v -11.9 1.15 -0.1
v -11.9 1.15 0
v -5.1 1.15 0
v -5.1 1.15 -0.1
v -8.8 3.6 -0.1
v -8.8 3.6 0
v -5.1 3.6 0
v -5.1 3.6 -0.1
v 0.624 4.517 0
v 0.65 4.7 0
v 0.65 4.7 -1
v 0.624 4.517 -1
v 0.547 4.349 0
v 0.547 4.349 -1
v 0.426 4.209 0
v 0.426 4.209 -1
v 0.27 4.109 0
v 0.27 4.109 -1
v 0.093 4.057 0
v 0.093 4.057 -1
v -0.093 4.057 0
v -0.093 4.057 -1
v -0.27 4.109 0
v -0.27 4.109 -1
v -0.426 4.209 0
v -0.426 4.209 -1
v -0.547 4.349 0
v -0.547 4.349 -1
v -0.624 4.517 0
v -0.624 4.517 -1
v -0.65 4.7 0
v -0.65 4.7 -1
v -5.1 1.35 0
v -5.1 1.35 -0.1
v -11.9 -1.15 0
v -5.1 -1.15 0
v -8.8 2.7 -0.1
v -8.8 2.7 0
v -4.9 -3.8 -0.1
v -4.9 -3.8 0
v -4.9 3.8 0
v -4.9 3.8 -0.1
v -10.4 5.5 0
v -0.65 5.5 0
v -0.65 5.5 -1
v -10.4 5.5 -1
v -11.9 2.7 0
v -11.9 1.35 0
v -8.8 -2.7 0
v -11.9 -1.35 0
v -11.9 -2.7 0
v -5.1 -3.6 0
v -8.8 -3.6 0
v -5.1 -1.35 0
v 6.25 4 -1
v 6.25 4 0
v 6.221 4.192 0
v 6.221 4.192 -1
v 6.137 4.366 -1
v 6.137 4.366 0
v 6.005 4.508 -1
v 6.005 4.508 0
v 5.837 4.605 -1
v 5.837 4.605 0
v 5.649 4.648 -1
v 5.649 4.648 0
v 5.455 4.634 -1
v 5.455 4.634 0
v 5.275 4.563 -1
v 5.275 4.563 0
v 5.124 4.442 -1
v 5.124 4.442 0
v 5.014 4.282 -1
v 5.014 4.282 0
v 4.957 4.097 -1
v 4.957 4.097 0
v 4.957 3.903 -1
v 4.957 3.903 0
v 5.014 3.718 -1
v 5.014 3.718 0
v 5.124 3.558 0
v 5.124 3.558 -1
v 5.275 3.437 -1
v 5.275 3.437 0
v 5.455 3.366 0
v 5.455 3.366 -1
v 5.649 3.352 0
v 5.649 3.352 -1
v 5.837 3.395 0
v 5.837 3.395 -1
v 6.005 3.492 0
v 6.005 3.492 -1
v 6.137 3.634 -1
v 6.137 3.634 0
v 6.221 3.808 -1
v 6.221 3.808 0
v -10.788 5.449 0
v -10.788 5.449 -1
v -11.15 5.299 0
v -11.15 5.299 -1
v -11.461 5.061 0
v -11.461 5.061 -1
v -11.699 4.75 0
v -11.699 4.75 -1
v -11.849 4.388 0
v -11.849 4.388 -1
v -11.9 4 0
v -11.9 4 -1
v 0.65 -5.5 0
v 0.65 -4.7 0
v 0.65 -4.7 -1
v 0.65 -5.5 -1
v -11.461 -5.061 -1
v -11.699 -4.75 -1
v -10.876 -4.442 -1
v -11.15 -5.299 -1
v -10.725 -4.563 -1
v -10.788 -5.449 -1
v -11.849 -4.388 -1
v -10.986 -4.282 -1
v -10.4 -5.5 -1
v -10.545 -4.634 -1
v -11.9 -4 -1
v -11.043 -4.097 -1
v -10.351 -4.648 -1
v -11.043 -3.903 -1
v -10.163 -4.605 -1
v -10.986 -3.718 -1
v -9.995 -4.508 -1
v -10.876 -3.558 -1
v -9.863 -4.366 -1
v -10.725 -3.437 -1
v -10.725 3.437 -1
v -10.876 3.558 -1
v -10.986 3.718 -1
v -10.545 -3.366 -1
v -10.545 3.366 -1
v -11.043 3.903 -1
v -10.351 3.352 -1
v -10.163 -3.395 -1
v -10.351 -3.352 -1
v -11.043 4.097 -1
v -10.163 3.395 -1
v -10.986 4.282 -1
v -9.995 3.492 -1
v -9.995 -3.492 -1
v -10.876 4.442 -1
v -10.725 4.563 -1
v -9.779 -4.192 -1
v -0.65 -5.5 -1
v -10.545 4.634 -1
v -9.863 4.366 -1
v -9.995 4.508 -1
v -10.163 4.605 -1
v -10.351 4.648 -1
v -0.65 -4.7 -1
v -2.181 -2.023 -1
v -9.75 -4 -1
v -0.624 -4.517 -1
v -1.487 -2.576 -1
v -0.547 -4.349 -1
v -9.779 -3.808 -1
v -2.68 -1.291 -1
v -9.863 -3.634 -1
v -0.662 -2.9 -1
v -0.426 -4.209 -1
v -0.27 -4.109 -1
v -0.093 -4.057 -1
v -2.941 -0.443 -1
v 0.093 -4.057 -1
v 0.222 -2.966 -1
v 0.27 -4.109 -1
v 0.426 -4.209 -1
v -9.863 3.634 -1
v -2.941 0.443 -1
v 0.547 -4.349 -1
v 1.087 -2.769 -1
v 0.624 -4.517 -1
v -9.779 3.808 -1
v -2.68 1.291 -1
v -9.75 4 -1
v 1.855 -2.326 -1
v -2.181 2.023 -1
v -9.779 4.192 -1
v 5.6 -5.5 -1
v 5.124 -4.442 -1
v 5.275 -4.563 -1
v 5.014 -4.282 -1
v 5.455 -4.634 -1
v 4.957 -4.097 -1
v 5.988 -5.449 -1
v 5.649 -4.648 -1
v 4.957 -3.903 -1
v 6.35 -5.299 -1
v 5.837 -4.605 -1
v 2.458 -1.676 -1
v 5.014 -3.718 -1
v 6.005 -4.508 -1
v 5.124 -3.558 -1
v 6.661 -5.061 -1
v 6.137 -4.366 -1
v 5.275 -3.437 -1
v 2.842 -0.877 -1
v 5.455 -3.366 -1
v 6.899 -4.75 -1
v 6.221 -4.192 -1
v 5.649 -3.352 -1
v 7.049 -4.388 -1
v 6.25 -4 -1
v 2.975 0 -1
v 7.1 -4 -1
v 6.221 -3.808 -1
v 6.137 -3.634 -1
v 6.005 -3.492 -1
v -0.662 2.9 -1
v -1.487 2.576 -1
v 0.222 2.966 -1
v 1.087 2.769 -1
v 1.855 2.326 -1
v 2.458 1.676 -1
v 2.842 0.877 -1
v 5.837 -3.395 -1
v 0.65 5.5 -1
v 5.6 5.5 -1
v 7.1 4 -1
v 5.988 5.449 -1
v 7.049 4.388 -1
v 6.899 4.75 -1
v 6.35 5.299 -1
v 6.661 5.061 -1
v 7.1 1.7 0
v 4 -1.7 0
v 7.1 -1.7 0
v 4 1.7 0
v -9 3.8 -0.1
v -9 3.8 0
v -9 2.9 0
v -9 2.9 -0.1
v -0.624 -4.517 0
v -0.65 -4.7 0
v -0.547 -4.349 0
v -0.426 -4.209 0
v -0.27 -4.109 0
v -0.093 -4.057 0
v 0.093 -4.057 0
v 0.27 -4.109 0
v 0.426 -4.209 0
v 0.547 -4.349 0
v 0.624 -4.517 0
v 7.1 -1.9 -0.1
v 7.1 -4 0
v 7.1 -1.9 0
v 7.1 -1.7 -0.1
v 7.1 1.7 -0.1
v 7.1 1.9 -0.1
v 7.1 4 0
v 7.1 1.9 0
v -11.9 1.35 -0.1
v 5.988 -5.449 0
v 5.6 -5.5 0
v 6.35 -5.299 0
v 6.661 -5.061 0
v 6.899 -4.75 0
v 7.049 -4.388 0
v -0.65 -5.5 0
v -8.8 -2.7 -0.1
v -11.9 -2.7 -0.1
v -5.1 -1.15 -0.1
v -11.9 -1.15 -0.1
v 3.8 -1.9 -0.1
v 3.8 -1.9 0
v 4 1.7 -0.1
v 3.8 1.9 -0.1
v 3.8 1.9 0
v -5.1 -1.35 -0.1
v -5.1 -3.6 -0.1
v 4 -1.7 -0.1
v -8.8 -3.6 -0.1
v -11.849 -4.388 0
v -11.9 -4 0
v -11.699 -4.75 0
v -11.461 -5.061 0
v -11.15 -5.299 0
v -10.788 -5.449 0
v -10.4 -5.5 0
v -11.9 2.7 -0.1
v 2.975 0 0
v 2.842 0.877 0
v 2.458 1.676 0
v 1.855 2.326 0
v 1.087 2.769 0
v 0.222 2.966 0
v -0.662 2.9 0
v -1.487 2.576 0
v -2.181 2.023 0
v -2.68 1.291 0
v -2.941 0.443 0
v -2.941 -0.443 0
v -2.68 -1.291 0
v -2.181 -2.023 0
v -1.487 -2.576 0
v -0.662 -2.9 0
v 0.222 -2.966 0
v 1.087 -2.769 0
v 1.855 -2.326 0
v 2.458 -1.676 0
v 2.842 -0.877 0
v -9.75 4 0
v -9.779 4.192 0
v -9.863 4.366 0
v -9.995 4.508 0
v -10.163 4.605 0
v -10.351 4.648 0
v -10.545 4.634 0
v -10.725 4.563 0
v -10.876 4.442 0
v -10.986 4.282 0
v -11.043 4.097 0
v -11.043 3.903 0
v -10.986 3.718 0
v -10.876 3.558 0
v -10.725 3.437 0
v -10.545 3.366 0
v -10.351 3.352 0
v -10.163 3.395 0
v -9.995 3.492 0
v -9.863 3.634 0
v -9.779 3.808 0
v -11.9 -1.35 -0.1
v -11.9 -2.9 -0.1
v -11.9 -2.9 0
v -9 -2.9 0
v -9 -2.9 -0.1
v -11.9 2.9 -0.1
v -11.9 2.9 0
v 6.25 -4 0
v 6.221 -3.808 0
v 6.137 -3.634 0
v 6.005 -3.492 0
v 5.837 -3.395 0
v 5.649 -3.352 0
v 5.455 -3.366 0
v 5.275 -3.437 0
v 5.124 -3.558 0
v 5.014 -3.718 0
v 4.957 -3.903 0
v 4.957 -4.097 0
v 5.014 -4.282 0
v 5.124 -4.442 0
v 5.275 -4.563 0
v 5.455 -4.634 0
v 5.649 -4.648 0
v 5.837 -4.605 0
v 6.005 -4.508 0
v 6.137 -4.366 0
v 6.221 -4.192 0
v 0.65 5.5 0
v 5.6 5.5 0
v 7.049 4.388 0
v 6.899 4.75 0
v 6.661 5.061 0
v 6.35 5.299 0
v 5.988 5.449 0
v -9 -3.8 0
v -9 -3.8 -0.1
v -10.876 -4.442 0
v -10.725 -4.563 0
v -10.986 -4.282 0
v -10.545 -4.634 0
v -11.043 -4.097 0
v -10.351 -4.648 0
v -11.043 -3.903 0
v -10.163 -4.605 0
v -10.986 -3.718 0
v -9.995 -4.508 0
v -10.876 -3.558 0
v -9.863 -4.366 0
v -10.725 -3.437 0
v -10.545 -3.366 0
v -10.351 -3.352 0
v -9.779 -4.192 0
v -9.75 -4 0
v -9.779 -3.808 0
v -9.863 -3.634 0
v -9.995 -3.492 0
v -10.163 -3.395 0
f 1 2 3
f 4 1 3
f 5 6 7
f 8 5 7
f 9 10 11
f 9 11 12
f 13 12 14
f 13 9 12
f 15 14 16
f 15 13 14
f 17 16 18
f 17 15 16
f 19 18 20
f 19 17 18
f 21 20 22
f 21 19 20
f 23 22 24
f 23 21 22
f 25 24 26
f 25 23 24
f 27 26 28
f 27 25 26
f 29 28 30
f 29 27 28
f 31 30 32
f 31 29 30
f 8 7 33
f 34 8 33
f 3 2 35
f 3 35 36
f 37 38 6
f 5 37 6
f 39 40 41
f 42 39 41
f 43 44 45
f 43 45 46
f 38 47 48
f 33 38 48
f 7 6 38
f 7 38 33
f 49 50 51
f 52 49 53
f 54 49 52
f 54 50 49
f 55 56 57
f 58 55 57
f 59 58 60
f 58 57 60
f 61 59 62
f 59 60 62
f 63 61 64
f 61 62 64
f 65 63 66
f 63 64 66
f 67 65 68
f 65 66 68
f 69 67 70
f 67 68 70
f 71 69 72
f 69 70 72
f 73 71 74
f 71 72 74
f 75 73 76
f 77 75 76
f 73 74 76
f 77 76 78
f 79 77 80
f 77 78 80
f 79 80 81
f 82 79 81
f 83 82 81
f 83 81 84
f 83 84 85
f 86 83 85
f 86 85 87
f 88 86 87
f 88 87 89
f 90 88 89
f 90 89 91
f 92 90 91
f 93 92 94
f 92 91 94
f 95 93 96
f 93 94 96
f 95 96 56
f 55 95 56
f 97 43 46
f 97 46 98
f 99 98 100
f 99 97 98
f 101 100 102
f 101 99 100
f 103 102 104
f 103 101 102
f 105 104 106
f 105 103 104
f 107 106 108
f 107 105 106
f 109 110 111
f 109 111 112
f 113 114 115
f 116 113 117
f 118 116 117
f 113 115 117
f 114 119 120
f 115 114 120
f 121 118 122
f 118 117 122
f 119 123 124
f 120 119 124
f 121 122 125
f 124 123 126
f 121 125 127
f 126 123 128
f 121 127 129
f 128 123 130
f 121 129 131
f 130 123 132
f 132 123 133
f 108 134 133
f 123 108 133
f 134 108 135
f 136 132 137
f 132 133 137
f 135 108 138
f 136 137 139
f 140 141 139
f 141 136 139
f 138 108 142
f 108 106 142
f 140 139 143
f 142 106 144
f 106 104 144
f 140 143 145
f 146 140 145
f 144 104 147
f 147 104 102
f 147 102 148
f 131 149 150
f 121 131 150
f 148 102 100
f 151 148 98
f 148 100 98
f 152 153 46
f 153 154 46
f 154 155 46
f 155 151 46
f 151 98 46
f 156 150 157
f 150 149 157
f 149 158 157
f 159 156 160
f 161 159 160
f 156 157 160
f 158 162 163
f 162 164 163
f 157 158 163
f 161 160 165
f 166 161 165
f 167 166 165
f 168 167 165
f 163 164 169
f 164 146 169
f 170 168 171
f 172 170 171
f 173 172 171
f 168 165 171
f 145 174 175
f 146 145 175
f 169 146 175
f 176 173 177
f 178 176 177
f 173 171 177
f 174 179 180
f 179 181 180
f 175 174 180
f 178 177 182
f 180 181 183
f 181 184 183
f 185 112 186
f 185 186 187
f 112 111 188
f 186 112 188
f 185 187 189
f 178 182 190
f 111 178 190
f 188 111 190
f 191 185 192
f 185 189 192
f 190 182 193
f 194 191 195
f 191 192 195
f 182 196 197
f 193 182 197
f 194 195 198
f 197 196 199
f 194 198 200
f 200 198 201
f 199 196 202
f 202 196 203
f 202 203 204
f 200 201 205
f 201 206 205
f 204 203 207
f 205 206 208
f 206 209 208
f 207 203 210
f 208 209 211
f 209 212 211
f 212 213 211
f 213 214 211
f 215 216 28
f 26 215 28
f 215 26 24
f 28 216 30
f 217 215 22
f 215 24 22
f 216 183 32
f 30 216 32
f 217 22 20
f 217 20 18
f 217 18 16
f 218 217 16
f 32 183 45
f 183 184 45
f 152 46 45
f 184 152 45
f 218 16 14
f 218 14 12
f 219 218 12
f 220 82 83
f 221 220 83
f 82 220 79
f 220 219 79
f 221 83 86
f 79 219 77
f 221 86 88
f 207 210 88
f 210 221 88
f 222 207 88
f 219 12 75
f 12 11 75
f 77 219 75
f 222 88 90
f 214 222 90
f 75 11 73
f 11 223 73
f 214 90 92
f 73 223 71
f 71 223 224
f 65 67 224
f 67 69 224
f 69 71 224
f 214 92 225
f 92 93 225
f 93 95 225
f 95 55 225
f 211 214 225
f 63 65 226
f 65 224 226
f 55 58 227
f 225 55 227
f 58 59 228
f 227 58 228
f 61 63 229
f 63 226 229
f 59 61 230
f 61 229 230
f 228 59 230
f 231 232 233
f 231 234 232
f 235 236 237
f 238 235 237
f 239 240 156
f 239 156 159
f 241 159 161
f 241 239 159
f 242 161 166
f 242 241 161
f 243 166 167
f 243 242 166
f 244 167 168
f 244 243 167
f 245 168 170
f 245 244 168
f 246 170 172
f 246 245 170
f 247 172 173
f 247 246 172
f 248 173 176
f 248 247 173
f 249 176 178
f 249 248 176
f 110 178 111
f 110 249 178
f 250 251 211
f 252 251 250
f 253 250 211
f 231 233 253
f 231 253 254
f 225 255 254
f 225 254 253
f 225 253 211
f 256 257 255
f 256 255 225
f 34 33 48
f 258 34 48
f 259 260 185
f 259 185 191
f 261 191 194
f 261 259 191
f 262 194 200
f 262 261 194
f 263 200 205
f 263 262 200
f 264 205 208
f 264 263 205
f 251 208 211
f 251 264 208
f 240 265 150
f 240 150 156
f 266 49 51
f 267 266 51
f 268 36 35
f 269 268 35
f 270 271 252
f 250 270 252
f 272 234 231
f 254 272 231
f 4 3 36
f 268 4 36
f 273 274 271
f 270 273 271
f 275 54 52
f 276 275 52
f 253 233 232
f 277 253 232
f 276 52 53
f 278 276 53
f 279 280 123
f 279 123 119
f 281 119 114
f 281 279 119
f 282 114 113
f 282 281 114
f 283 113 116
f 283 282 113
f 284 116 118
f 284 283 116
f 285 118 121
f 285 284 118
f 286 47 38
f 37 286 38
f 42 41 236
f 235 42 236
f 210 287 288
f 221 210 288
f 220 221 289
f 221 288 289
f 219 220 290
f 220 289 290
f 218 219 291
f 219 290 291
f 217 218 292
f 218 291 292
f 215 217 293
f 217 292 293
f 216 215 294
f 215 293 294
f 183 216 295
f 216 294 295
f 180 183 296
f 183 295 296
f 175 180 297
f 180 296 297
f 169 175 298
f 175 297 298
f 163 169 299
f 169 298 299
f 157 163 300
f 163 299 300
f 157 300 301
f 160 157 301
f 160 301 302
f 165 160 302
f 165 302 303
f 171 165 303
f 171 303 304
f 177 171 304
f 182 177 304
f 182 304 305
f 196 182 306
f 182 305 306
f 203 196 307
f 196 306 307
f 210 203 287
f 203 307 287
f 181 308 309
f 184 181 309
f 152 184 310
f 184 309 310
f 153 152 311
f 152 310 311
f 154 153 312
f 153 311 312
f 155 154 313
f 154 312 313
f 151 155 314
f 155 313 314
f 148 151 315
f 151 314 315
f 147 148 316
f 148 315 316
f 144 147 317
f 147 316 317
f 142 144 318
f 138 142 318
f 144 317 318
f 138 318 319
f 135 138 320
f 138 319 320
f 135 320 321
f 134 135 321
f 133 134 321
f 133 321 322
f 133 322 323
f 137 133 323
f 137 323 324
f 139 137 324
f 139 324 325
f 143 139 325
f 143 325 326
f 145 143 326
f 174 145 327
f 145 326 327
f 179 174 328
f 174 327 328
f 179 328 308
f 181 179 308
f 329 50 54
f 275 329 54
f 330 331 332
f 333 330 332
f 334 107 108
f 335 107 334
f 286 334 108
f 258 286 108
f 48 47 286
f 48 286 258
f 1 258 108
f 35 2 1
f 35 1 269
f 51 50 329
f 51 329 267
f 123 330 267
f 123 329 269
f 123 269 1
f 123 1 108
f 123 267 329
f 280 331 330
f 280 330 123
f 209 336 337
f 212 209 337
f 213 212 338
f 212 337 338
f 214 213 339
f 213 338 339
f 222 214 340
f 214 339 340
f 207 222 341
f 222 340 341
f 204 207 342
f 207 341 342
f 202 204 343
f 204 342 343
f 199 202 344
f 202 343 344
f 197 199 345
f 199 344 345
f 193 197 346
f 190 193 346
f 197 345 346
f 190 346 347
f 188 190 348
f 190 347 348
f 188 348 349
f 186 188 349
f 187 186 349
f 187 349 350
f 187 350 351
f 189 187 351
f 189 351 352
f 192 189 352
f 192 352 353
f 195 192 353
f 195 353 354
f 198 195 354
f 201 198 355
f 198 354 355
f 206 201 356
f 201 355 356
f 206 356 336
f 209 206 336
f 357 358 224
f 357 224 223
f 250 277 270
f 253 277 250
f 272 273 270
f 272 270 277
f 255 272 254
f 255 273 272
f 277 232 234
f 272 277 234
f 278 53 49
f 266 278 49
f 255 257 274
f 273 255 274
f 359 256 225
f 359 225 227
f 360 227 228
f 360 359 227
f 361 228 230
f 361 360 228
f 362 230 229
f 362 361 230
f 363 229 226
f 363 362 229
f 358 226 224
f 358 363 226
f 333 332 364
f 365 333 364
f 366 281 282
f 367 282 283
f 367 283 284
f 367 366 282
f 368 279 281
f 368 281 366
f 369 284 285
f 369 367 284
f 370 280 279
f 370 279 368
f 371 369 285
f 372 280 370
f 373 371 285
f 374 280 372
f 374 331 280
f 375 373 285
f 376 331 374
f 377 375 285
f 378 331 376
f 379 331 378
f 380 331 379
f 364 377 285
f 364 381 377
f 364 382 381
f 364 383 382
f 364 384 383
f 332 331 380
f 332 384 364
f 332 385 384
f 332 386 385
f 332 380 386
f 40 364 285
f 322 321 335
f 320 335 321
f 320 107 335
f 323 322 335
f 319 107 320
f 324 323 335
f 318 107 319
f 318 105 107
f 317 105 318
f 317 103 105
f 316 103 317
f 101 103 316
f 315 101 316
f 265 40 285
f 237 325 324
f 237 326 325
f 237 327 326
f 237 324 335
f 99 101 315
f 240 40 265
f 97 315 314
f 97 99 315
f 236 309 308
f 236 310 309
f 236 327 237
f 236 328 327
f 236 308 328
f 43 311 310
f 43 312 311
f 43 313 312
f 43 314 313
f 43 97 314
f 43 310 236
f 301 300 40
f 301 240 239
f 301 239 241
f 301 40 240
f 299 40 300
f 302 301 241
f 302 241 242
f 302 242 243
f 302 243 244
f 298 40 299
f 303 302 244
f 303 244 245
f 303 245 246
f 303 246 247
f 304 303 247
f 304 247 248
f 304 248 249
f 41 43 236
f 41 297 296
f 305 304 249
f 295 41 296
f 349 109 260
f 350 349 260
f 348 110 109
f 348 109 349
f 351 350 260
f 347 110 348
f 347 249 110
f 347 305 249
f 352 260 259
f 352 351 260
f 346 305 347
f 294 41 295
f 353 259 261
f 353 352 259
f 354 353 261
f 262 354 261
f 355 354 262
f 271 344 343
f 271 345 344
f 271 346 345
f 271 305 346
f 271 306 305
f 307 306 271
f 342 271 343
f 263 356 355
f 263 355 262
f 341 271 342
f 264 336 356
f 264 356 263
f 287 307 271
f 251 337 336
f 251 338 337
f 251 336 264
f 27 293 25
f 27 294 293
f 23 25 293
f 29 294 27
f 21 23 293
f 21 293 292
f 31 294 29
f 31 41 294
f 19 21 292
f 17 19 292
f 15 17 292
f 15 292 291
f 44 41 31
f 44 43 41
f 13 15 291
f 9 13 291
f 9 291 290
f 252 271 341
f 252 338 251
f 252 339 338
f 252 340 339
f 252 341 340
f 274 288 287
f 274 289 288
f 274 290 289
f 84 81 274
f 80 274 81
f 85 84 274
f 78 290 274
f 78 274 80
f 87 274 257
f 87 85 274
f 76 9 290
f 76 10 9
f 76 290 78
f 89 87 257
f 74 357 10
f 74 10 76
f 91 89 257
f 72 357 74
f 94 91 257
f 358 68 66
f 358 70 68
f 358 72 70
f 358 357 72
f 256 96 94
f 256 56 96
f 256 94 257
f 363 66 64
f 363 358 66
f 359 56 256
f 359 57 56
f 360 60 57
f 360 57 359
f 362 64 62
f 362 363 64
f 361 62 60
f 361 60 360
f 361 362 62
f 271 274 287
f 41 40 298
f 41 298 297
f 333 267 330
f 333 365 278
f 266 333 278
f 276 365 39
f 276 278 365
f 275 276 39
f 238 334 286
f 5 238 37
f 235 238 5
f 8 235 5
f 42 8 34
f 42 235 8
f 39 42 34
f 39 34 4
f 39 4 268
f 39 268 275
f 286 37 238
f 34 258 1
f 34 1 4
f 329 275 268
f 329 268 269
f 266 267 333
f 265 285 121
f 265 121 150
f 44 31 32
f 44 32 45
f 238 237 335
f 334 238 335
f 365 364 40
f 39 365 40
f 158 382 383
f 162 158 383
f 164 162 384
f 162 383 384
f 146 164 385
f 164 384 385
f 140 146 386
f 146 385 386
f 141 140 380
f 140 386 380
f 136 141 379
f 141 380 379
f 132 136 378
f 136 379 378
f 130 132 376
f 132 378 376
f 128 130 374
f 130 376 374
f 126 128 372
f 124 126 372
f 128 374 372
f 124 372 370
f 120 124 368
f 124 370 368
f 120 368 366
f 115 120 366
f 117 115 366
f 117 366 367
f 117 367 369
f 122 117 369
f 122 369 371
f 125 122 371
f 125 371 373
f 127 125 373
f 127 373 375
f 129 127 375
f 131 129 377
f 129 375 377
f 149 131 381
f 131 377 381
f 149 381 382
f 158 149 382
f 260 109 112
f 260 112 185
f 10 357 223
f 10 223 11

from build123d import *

# Parameters (mm, degrees)
MODEL_R             = 0.65
MODEL_R_2           = 2.974594
EXTRUDE_1_DEPTH     = 1
CUT_EXTRUDE_1_DEPTH = 0.1


with BuildPart() as part:
    # Model → Бобышка-Вытянуть1 (new body)
    with BuildSketch(Plane.XY):
        with BuildLine():
            Line((-10.4, -5.5), (-4.7, -5.5))
            Line((-4.7, -5.5), (-0.65, -5.5))
            Line((-0.65, -5.5), (-0.65, -4.7))
            ThreePointArc((-0.65, -4.7), (0, -4.05), (0.65, -4.7))
            Line((0.65, -4.7), (0.65, -5.5))
            Line((0.65, -5.5), (3.6, -5.5))
            Line((3.6, -5.5), (5.6, -5.5))
            ThreePointArc((5.6, -5.5), (6.660660172, -5.060660172), (7.1, -4))
            Line((7.1, -4), (7.1, -1.6))
            Line((7.1, -1.6), (7.1, 1.6))
            Line((7.1, 1.6), (7.1, 4))
            ThreePointArc((7.1, 4), (6.660660172, 5.060660172), (5.6, 5.5))
            Line((5.6, 5.5), (3.6, 5.5))
            Line((3.6, 5.5), (0.65, 5.5))
            Line((0.65, 5.5), (0.65, 4.7))
            ThreePointArc((0.65, 4.7), (0, 4.05), (-0.65, 4.7))
            Line((-0.65, 4.7), (-0.65, 5.5))
            Line((-0.65, 5.5), (-4.7, 5.5))
            Line((-4.7, 5.5), (-10.4, 5.5))
            ThreePointArc((-10.4, 5.5), (-11.460660172, 5.060660172), (-11.9, 4))
            Line((-11.9, 4), (-11.9, 2.6))
            Line((-11.9, 2.6), (-11.9, 1.5))
            Line((-11.9, 1.5), (-11.9, 1))
            Line((-11.9, 1), (-11.9, -1))
            Line((-11.9, -1), (-11.9, -1.5))
            Line((-11.9, -1.5), (-11.9, -2.6))
            Line((-11.9, -2.6), (-11.9, -4))
            ThreePointArc((-11.9, -4), (-11.460660172, -5.060660172), (-10.4, -5.5))
        make_face()
        with Locations((5.6, -4)):
            Circle(MODEL_R, mode=Mode.SUBTRACT)
        Circle(MODEL_R_2, mode=Mode.SUBTRACT)
        with Locations((5.6, 4)):
            Circle(MODEL_R, mode=Mode.SUBTRACT)
        with Locations((-10.4, -4)):
            Circle(MODEL_R, mode=Mode.SUBTRACT)
        with Locations((-10.4, 4)):
            Circle(MODEL_R, mode=Mode.SUBTRACT)
    extrude(amount=-EXTRUDE_1_DEPTH)

    # Model<3> → Вырез-Вытянуть1 (cut)
    with BuildSketch(Plane.XY):
        Polygon((-11.9, -2.7), (-11.9, -2.900000006), (-9.000000006, -2.900000006), (-9.000000006, -3.800000006), (-4.899999994, -3.800000006), (-4.899999994, 3.800000006), (-9.000000006, 3.800000006), (-9.000000006, 2.900000006), (-11.9, 2.900000006), (-11.9, 2.7), (-8.8, 2.7), (-8.8, 3.6), (-5.1, 3.6), (-5.1, 1.35), (-11.9, 1.35), (-11.9, 1.15), (-5.1, 1.15), (-5.1, -1.15), (-11.9, -1.15), (-11.9, -1.35), (-5.1, -1.35), (-5.1, -3.6), (-8.8, -3.6), (-8.8, -2.7), align=None)
        Polygon((3.799999994, -1.900000006), (7.1, -1.900000006), (7.1, -1.7), (4, -1.7), (4, 1.7), (7.1, 1.7), (7.1, 1.900000006), (3.799999994, 1.900000006), align=None)
    extrude(amount=-CUT_EXTRUDE_1_DEPTH, mode=Mode.SUBTRACT)


solid = part.part
